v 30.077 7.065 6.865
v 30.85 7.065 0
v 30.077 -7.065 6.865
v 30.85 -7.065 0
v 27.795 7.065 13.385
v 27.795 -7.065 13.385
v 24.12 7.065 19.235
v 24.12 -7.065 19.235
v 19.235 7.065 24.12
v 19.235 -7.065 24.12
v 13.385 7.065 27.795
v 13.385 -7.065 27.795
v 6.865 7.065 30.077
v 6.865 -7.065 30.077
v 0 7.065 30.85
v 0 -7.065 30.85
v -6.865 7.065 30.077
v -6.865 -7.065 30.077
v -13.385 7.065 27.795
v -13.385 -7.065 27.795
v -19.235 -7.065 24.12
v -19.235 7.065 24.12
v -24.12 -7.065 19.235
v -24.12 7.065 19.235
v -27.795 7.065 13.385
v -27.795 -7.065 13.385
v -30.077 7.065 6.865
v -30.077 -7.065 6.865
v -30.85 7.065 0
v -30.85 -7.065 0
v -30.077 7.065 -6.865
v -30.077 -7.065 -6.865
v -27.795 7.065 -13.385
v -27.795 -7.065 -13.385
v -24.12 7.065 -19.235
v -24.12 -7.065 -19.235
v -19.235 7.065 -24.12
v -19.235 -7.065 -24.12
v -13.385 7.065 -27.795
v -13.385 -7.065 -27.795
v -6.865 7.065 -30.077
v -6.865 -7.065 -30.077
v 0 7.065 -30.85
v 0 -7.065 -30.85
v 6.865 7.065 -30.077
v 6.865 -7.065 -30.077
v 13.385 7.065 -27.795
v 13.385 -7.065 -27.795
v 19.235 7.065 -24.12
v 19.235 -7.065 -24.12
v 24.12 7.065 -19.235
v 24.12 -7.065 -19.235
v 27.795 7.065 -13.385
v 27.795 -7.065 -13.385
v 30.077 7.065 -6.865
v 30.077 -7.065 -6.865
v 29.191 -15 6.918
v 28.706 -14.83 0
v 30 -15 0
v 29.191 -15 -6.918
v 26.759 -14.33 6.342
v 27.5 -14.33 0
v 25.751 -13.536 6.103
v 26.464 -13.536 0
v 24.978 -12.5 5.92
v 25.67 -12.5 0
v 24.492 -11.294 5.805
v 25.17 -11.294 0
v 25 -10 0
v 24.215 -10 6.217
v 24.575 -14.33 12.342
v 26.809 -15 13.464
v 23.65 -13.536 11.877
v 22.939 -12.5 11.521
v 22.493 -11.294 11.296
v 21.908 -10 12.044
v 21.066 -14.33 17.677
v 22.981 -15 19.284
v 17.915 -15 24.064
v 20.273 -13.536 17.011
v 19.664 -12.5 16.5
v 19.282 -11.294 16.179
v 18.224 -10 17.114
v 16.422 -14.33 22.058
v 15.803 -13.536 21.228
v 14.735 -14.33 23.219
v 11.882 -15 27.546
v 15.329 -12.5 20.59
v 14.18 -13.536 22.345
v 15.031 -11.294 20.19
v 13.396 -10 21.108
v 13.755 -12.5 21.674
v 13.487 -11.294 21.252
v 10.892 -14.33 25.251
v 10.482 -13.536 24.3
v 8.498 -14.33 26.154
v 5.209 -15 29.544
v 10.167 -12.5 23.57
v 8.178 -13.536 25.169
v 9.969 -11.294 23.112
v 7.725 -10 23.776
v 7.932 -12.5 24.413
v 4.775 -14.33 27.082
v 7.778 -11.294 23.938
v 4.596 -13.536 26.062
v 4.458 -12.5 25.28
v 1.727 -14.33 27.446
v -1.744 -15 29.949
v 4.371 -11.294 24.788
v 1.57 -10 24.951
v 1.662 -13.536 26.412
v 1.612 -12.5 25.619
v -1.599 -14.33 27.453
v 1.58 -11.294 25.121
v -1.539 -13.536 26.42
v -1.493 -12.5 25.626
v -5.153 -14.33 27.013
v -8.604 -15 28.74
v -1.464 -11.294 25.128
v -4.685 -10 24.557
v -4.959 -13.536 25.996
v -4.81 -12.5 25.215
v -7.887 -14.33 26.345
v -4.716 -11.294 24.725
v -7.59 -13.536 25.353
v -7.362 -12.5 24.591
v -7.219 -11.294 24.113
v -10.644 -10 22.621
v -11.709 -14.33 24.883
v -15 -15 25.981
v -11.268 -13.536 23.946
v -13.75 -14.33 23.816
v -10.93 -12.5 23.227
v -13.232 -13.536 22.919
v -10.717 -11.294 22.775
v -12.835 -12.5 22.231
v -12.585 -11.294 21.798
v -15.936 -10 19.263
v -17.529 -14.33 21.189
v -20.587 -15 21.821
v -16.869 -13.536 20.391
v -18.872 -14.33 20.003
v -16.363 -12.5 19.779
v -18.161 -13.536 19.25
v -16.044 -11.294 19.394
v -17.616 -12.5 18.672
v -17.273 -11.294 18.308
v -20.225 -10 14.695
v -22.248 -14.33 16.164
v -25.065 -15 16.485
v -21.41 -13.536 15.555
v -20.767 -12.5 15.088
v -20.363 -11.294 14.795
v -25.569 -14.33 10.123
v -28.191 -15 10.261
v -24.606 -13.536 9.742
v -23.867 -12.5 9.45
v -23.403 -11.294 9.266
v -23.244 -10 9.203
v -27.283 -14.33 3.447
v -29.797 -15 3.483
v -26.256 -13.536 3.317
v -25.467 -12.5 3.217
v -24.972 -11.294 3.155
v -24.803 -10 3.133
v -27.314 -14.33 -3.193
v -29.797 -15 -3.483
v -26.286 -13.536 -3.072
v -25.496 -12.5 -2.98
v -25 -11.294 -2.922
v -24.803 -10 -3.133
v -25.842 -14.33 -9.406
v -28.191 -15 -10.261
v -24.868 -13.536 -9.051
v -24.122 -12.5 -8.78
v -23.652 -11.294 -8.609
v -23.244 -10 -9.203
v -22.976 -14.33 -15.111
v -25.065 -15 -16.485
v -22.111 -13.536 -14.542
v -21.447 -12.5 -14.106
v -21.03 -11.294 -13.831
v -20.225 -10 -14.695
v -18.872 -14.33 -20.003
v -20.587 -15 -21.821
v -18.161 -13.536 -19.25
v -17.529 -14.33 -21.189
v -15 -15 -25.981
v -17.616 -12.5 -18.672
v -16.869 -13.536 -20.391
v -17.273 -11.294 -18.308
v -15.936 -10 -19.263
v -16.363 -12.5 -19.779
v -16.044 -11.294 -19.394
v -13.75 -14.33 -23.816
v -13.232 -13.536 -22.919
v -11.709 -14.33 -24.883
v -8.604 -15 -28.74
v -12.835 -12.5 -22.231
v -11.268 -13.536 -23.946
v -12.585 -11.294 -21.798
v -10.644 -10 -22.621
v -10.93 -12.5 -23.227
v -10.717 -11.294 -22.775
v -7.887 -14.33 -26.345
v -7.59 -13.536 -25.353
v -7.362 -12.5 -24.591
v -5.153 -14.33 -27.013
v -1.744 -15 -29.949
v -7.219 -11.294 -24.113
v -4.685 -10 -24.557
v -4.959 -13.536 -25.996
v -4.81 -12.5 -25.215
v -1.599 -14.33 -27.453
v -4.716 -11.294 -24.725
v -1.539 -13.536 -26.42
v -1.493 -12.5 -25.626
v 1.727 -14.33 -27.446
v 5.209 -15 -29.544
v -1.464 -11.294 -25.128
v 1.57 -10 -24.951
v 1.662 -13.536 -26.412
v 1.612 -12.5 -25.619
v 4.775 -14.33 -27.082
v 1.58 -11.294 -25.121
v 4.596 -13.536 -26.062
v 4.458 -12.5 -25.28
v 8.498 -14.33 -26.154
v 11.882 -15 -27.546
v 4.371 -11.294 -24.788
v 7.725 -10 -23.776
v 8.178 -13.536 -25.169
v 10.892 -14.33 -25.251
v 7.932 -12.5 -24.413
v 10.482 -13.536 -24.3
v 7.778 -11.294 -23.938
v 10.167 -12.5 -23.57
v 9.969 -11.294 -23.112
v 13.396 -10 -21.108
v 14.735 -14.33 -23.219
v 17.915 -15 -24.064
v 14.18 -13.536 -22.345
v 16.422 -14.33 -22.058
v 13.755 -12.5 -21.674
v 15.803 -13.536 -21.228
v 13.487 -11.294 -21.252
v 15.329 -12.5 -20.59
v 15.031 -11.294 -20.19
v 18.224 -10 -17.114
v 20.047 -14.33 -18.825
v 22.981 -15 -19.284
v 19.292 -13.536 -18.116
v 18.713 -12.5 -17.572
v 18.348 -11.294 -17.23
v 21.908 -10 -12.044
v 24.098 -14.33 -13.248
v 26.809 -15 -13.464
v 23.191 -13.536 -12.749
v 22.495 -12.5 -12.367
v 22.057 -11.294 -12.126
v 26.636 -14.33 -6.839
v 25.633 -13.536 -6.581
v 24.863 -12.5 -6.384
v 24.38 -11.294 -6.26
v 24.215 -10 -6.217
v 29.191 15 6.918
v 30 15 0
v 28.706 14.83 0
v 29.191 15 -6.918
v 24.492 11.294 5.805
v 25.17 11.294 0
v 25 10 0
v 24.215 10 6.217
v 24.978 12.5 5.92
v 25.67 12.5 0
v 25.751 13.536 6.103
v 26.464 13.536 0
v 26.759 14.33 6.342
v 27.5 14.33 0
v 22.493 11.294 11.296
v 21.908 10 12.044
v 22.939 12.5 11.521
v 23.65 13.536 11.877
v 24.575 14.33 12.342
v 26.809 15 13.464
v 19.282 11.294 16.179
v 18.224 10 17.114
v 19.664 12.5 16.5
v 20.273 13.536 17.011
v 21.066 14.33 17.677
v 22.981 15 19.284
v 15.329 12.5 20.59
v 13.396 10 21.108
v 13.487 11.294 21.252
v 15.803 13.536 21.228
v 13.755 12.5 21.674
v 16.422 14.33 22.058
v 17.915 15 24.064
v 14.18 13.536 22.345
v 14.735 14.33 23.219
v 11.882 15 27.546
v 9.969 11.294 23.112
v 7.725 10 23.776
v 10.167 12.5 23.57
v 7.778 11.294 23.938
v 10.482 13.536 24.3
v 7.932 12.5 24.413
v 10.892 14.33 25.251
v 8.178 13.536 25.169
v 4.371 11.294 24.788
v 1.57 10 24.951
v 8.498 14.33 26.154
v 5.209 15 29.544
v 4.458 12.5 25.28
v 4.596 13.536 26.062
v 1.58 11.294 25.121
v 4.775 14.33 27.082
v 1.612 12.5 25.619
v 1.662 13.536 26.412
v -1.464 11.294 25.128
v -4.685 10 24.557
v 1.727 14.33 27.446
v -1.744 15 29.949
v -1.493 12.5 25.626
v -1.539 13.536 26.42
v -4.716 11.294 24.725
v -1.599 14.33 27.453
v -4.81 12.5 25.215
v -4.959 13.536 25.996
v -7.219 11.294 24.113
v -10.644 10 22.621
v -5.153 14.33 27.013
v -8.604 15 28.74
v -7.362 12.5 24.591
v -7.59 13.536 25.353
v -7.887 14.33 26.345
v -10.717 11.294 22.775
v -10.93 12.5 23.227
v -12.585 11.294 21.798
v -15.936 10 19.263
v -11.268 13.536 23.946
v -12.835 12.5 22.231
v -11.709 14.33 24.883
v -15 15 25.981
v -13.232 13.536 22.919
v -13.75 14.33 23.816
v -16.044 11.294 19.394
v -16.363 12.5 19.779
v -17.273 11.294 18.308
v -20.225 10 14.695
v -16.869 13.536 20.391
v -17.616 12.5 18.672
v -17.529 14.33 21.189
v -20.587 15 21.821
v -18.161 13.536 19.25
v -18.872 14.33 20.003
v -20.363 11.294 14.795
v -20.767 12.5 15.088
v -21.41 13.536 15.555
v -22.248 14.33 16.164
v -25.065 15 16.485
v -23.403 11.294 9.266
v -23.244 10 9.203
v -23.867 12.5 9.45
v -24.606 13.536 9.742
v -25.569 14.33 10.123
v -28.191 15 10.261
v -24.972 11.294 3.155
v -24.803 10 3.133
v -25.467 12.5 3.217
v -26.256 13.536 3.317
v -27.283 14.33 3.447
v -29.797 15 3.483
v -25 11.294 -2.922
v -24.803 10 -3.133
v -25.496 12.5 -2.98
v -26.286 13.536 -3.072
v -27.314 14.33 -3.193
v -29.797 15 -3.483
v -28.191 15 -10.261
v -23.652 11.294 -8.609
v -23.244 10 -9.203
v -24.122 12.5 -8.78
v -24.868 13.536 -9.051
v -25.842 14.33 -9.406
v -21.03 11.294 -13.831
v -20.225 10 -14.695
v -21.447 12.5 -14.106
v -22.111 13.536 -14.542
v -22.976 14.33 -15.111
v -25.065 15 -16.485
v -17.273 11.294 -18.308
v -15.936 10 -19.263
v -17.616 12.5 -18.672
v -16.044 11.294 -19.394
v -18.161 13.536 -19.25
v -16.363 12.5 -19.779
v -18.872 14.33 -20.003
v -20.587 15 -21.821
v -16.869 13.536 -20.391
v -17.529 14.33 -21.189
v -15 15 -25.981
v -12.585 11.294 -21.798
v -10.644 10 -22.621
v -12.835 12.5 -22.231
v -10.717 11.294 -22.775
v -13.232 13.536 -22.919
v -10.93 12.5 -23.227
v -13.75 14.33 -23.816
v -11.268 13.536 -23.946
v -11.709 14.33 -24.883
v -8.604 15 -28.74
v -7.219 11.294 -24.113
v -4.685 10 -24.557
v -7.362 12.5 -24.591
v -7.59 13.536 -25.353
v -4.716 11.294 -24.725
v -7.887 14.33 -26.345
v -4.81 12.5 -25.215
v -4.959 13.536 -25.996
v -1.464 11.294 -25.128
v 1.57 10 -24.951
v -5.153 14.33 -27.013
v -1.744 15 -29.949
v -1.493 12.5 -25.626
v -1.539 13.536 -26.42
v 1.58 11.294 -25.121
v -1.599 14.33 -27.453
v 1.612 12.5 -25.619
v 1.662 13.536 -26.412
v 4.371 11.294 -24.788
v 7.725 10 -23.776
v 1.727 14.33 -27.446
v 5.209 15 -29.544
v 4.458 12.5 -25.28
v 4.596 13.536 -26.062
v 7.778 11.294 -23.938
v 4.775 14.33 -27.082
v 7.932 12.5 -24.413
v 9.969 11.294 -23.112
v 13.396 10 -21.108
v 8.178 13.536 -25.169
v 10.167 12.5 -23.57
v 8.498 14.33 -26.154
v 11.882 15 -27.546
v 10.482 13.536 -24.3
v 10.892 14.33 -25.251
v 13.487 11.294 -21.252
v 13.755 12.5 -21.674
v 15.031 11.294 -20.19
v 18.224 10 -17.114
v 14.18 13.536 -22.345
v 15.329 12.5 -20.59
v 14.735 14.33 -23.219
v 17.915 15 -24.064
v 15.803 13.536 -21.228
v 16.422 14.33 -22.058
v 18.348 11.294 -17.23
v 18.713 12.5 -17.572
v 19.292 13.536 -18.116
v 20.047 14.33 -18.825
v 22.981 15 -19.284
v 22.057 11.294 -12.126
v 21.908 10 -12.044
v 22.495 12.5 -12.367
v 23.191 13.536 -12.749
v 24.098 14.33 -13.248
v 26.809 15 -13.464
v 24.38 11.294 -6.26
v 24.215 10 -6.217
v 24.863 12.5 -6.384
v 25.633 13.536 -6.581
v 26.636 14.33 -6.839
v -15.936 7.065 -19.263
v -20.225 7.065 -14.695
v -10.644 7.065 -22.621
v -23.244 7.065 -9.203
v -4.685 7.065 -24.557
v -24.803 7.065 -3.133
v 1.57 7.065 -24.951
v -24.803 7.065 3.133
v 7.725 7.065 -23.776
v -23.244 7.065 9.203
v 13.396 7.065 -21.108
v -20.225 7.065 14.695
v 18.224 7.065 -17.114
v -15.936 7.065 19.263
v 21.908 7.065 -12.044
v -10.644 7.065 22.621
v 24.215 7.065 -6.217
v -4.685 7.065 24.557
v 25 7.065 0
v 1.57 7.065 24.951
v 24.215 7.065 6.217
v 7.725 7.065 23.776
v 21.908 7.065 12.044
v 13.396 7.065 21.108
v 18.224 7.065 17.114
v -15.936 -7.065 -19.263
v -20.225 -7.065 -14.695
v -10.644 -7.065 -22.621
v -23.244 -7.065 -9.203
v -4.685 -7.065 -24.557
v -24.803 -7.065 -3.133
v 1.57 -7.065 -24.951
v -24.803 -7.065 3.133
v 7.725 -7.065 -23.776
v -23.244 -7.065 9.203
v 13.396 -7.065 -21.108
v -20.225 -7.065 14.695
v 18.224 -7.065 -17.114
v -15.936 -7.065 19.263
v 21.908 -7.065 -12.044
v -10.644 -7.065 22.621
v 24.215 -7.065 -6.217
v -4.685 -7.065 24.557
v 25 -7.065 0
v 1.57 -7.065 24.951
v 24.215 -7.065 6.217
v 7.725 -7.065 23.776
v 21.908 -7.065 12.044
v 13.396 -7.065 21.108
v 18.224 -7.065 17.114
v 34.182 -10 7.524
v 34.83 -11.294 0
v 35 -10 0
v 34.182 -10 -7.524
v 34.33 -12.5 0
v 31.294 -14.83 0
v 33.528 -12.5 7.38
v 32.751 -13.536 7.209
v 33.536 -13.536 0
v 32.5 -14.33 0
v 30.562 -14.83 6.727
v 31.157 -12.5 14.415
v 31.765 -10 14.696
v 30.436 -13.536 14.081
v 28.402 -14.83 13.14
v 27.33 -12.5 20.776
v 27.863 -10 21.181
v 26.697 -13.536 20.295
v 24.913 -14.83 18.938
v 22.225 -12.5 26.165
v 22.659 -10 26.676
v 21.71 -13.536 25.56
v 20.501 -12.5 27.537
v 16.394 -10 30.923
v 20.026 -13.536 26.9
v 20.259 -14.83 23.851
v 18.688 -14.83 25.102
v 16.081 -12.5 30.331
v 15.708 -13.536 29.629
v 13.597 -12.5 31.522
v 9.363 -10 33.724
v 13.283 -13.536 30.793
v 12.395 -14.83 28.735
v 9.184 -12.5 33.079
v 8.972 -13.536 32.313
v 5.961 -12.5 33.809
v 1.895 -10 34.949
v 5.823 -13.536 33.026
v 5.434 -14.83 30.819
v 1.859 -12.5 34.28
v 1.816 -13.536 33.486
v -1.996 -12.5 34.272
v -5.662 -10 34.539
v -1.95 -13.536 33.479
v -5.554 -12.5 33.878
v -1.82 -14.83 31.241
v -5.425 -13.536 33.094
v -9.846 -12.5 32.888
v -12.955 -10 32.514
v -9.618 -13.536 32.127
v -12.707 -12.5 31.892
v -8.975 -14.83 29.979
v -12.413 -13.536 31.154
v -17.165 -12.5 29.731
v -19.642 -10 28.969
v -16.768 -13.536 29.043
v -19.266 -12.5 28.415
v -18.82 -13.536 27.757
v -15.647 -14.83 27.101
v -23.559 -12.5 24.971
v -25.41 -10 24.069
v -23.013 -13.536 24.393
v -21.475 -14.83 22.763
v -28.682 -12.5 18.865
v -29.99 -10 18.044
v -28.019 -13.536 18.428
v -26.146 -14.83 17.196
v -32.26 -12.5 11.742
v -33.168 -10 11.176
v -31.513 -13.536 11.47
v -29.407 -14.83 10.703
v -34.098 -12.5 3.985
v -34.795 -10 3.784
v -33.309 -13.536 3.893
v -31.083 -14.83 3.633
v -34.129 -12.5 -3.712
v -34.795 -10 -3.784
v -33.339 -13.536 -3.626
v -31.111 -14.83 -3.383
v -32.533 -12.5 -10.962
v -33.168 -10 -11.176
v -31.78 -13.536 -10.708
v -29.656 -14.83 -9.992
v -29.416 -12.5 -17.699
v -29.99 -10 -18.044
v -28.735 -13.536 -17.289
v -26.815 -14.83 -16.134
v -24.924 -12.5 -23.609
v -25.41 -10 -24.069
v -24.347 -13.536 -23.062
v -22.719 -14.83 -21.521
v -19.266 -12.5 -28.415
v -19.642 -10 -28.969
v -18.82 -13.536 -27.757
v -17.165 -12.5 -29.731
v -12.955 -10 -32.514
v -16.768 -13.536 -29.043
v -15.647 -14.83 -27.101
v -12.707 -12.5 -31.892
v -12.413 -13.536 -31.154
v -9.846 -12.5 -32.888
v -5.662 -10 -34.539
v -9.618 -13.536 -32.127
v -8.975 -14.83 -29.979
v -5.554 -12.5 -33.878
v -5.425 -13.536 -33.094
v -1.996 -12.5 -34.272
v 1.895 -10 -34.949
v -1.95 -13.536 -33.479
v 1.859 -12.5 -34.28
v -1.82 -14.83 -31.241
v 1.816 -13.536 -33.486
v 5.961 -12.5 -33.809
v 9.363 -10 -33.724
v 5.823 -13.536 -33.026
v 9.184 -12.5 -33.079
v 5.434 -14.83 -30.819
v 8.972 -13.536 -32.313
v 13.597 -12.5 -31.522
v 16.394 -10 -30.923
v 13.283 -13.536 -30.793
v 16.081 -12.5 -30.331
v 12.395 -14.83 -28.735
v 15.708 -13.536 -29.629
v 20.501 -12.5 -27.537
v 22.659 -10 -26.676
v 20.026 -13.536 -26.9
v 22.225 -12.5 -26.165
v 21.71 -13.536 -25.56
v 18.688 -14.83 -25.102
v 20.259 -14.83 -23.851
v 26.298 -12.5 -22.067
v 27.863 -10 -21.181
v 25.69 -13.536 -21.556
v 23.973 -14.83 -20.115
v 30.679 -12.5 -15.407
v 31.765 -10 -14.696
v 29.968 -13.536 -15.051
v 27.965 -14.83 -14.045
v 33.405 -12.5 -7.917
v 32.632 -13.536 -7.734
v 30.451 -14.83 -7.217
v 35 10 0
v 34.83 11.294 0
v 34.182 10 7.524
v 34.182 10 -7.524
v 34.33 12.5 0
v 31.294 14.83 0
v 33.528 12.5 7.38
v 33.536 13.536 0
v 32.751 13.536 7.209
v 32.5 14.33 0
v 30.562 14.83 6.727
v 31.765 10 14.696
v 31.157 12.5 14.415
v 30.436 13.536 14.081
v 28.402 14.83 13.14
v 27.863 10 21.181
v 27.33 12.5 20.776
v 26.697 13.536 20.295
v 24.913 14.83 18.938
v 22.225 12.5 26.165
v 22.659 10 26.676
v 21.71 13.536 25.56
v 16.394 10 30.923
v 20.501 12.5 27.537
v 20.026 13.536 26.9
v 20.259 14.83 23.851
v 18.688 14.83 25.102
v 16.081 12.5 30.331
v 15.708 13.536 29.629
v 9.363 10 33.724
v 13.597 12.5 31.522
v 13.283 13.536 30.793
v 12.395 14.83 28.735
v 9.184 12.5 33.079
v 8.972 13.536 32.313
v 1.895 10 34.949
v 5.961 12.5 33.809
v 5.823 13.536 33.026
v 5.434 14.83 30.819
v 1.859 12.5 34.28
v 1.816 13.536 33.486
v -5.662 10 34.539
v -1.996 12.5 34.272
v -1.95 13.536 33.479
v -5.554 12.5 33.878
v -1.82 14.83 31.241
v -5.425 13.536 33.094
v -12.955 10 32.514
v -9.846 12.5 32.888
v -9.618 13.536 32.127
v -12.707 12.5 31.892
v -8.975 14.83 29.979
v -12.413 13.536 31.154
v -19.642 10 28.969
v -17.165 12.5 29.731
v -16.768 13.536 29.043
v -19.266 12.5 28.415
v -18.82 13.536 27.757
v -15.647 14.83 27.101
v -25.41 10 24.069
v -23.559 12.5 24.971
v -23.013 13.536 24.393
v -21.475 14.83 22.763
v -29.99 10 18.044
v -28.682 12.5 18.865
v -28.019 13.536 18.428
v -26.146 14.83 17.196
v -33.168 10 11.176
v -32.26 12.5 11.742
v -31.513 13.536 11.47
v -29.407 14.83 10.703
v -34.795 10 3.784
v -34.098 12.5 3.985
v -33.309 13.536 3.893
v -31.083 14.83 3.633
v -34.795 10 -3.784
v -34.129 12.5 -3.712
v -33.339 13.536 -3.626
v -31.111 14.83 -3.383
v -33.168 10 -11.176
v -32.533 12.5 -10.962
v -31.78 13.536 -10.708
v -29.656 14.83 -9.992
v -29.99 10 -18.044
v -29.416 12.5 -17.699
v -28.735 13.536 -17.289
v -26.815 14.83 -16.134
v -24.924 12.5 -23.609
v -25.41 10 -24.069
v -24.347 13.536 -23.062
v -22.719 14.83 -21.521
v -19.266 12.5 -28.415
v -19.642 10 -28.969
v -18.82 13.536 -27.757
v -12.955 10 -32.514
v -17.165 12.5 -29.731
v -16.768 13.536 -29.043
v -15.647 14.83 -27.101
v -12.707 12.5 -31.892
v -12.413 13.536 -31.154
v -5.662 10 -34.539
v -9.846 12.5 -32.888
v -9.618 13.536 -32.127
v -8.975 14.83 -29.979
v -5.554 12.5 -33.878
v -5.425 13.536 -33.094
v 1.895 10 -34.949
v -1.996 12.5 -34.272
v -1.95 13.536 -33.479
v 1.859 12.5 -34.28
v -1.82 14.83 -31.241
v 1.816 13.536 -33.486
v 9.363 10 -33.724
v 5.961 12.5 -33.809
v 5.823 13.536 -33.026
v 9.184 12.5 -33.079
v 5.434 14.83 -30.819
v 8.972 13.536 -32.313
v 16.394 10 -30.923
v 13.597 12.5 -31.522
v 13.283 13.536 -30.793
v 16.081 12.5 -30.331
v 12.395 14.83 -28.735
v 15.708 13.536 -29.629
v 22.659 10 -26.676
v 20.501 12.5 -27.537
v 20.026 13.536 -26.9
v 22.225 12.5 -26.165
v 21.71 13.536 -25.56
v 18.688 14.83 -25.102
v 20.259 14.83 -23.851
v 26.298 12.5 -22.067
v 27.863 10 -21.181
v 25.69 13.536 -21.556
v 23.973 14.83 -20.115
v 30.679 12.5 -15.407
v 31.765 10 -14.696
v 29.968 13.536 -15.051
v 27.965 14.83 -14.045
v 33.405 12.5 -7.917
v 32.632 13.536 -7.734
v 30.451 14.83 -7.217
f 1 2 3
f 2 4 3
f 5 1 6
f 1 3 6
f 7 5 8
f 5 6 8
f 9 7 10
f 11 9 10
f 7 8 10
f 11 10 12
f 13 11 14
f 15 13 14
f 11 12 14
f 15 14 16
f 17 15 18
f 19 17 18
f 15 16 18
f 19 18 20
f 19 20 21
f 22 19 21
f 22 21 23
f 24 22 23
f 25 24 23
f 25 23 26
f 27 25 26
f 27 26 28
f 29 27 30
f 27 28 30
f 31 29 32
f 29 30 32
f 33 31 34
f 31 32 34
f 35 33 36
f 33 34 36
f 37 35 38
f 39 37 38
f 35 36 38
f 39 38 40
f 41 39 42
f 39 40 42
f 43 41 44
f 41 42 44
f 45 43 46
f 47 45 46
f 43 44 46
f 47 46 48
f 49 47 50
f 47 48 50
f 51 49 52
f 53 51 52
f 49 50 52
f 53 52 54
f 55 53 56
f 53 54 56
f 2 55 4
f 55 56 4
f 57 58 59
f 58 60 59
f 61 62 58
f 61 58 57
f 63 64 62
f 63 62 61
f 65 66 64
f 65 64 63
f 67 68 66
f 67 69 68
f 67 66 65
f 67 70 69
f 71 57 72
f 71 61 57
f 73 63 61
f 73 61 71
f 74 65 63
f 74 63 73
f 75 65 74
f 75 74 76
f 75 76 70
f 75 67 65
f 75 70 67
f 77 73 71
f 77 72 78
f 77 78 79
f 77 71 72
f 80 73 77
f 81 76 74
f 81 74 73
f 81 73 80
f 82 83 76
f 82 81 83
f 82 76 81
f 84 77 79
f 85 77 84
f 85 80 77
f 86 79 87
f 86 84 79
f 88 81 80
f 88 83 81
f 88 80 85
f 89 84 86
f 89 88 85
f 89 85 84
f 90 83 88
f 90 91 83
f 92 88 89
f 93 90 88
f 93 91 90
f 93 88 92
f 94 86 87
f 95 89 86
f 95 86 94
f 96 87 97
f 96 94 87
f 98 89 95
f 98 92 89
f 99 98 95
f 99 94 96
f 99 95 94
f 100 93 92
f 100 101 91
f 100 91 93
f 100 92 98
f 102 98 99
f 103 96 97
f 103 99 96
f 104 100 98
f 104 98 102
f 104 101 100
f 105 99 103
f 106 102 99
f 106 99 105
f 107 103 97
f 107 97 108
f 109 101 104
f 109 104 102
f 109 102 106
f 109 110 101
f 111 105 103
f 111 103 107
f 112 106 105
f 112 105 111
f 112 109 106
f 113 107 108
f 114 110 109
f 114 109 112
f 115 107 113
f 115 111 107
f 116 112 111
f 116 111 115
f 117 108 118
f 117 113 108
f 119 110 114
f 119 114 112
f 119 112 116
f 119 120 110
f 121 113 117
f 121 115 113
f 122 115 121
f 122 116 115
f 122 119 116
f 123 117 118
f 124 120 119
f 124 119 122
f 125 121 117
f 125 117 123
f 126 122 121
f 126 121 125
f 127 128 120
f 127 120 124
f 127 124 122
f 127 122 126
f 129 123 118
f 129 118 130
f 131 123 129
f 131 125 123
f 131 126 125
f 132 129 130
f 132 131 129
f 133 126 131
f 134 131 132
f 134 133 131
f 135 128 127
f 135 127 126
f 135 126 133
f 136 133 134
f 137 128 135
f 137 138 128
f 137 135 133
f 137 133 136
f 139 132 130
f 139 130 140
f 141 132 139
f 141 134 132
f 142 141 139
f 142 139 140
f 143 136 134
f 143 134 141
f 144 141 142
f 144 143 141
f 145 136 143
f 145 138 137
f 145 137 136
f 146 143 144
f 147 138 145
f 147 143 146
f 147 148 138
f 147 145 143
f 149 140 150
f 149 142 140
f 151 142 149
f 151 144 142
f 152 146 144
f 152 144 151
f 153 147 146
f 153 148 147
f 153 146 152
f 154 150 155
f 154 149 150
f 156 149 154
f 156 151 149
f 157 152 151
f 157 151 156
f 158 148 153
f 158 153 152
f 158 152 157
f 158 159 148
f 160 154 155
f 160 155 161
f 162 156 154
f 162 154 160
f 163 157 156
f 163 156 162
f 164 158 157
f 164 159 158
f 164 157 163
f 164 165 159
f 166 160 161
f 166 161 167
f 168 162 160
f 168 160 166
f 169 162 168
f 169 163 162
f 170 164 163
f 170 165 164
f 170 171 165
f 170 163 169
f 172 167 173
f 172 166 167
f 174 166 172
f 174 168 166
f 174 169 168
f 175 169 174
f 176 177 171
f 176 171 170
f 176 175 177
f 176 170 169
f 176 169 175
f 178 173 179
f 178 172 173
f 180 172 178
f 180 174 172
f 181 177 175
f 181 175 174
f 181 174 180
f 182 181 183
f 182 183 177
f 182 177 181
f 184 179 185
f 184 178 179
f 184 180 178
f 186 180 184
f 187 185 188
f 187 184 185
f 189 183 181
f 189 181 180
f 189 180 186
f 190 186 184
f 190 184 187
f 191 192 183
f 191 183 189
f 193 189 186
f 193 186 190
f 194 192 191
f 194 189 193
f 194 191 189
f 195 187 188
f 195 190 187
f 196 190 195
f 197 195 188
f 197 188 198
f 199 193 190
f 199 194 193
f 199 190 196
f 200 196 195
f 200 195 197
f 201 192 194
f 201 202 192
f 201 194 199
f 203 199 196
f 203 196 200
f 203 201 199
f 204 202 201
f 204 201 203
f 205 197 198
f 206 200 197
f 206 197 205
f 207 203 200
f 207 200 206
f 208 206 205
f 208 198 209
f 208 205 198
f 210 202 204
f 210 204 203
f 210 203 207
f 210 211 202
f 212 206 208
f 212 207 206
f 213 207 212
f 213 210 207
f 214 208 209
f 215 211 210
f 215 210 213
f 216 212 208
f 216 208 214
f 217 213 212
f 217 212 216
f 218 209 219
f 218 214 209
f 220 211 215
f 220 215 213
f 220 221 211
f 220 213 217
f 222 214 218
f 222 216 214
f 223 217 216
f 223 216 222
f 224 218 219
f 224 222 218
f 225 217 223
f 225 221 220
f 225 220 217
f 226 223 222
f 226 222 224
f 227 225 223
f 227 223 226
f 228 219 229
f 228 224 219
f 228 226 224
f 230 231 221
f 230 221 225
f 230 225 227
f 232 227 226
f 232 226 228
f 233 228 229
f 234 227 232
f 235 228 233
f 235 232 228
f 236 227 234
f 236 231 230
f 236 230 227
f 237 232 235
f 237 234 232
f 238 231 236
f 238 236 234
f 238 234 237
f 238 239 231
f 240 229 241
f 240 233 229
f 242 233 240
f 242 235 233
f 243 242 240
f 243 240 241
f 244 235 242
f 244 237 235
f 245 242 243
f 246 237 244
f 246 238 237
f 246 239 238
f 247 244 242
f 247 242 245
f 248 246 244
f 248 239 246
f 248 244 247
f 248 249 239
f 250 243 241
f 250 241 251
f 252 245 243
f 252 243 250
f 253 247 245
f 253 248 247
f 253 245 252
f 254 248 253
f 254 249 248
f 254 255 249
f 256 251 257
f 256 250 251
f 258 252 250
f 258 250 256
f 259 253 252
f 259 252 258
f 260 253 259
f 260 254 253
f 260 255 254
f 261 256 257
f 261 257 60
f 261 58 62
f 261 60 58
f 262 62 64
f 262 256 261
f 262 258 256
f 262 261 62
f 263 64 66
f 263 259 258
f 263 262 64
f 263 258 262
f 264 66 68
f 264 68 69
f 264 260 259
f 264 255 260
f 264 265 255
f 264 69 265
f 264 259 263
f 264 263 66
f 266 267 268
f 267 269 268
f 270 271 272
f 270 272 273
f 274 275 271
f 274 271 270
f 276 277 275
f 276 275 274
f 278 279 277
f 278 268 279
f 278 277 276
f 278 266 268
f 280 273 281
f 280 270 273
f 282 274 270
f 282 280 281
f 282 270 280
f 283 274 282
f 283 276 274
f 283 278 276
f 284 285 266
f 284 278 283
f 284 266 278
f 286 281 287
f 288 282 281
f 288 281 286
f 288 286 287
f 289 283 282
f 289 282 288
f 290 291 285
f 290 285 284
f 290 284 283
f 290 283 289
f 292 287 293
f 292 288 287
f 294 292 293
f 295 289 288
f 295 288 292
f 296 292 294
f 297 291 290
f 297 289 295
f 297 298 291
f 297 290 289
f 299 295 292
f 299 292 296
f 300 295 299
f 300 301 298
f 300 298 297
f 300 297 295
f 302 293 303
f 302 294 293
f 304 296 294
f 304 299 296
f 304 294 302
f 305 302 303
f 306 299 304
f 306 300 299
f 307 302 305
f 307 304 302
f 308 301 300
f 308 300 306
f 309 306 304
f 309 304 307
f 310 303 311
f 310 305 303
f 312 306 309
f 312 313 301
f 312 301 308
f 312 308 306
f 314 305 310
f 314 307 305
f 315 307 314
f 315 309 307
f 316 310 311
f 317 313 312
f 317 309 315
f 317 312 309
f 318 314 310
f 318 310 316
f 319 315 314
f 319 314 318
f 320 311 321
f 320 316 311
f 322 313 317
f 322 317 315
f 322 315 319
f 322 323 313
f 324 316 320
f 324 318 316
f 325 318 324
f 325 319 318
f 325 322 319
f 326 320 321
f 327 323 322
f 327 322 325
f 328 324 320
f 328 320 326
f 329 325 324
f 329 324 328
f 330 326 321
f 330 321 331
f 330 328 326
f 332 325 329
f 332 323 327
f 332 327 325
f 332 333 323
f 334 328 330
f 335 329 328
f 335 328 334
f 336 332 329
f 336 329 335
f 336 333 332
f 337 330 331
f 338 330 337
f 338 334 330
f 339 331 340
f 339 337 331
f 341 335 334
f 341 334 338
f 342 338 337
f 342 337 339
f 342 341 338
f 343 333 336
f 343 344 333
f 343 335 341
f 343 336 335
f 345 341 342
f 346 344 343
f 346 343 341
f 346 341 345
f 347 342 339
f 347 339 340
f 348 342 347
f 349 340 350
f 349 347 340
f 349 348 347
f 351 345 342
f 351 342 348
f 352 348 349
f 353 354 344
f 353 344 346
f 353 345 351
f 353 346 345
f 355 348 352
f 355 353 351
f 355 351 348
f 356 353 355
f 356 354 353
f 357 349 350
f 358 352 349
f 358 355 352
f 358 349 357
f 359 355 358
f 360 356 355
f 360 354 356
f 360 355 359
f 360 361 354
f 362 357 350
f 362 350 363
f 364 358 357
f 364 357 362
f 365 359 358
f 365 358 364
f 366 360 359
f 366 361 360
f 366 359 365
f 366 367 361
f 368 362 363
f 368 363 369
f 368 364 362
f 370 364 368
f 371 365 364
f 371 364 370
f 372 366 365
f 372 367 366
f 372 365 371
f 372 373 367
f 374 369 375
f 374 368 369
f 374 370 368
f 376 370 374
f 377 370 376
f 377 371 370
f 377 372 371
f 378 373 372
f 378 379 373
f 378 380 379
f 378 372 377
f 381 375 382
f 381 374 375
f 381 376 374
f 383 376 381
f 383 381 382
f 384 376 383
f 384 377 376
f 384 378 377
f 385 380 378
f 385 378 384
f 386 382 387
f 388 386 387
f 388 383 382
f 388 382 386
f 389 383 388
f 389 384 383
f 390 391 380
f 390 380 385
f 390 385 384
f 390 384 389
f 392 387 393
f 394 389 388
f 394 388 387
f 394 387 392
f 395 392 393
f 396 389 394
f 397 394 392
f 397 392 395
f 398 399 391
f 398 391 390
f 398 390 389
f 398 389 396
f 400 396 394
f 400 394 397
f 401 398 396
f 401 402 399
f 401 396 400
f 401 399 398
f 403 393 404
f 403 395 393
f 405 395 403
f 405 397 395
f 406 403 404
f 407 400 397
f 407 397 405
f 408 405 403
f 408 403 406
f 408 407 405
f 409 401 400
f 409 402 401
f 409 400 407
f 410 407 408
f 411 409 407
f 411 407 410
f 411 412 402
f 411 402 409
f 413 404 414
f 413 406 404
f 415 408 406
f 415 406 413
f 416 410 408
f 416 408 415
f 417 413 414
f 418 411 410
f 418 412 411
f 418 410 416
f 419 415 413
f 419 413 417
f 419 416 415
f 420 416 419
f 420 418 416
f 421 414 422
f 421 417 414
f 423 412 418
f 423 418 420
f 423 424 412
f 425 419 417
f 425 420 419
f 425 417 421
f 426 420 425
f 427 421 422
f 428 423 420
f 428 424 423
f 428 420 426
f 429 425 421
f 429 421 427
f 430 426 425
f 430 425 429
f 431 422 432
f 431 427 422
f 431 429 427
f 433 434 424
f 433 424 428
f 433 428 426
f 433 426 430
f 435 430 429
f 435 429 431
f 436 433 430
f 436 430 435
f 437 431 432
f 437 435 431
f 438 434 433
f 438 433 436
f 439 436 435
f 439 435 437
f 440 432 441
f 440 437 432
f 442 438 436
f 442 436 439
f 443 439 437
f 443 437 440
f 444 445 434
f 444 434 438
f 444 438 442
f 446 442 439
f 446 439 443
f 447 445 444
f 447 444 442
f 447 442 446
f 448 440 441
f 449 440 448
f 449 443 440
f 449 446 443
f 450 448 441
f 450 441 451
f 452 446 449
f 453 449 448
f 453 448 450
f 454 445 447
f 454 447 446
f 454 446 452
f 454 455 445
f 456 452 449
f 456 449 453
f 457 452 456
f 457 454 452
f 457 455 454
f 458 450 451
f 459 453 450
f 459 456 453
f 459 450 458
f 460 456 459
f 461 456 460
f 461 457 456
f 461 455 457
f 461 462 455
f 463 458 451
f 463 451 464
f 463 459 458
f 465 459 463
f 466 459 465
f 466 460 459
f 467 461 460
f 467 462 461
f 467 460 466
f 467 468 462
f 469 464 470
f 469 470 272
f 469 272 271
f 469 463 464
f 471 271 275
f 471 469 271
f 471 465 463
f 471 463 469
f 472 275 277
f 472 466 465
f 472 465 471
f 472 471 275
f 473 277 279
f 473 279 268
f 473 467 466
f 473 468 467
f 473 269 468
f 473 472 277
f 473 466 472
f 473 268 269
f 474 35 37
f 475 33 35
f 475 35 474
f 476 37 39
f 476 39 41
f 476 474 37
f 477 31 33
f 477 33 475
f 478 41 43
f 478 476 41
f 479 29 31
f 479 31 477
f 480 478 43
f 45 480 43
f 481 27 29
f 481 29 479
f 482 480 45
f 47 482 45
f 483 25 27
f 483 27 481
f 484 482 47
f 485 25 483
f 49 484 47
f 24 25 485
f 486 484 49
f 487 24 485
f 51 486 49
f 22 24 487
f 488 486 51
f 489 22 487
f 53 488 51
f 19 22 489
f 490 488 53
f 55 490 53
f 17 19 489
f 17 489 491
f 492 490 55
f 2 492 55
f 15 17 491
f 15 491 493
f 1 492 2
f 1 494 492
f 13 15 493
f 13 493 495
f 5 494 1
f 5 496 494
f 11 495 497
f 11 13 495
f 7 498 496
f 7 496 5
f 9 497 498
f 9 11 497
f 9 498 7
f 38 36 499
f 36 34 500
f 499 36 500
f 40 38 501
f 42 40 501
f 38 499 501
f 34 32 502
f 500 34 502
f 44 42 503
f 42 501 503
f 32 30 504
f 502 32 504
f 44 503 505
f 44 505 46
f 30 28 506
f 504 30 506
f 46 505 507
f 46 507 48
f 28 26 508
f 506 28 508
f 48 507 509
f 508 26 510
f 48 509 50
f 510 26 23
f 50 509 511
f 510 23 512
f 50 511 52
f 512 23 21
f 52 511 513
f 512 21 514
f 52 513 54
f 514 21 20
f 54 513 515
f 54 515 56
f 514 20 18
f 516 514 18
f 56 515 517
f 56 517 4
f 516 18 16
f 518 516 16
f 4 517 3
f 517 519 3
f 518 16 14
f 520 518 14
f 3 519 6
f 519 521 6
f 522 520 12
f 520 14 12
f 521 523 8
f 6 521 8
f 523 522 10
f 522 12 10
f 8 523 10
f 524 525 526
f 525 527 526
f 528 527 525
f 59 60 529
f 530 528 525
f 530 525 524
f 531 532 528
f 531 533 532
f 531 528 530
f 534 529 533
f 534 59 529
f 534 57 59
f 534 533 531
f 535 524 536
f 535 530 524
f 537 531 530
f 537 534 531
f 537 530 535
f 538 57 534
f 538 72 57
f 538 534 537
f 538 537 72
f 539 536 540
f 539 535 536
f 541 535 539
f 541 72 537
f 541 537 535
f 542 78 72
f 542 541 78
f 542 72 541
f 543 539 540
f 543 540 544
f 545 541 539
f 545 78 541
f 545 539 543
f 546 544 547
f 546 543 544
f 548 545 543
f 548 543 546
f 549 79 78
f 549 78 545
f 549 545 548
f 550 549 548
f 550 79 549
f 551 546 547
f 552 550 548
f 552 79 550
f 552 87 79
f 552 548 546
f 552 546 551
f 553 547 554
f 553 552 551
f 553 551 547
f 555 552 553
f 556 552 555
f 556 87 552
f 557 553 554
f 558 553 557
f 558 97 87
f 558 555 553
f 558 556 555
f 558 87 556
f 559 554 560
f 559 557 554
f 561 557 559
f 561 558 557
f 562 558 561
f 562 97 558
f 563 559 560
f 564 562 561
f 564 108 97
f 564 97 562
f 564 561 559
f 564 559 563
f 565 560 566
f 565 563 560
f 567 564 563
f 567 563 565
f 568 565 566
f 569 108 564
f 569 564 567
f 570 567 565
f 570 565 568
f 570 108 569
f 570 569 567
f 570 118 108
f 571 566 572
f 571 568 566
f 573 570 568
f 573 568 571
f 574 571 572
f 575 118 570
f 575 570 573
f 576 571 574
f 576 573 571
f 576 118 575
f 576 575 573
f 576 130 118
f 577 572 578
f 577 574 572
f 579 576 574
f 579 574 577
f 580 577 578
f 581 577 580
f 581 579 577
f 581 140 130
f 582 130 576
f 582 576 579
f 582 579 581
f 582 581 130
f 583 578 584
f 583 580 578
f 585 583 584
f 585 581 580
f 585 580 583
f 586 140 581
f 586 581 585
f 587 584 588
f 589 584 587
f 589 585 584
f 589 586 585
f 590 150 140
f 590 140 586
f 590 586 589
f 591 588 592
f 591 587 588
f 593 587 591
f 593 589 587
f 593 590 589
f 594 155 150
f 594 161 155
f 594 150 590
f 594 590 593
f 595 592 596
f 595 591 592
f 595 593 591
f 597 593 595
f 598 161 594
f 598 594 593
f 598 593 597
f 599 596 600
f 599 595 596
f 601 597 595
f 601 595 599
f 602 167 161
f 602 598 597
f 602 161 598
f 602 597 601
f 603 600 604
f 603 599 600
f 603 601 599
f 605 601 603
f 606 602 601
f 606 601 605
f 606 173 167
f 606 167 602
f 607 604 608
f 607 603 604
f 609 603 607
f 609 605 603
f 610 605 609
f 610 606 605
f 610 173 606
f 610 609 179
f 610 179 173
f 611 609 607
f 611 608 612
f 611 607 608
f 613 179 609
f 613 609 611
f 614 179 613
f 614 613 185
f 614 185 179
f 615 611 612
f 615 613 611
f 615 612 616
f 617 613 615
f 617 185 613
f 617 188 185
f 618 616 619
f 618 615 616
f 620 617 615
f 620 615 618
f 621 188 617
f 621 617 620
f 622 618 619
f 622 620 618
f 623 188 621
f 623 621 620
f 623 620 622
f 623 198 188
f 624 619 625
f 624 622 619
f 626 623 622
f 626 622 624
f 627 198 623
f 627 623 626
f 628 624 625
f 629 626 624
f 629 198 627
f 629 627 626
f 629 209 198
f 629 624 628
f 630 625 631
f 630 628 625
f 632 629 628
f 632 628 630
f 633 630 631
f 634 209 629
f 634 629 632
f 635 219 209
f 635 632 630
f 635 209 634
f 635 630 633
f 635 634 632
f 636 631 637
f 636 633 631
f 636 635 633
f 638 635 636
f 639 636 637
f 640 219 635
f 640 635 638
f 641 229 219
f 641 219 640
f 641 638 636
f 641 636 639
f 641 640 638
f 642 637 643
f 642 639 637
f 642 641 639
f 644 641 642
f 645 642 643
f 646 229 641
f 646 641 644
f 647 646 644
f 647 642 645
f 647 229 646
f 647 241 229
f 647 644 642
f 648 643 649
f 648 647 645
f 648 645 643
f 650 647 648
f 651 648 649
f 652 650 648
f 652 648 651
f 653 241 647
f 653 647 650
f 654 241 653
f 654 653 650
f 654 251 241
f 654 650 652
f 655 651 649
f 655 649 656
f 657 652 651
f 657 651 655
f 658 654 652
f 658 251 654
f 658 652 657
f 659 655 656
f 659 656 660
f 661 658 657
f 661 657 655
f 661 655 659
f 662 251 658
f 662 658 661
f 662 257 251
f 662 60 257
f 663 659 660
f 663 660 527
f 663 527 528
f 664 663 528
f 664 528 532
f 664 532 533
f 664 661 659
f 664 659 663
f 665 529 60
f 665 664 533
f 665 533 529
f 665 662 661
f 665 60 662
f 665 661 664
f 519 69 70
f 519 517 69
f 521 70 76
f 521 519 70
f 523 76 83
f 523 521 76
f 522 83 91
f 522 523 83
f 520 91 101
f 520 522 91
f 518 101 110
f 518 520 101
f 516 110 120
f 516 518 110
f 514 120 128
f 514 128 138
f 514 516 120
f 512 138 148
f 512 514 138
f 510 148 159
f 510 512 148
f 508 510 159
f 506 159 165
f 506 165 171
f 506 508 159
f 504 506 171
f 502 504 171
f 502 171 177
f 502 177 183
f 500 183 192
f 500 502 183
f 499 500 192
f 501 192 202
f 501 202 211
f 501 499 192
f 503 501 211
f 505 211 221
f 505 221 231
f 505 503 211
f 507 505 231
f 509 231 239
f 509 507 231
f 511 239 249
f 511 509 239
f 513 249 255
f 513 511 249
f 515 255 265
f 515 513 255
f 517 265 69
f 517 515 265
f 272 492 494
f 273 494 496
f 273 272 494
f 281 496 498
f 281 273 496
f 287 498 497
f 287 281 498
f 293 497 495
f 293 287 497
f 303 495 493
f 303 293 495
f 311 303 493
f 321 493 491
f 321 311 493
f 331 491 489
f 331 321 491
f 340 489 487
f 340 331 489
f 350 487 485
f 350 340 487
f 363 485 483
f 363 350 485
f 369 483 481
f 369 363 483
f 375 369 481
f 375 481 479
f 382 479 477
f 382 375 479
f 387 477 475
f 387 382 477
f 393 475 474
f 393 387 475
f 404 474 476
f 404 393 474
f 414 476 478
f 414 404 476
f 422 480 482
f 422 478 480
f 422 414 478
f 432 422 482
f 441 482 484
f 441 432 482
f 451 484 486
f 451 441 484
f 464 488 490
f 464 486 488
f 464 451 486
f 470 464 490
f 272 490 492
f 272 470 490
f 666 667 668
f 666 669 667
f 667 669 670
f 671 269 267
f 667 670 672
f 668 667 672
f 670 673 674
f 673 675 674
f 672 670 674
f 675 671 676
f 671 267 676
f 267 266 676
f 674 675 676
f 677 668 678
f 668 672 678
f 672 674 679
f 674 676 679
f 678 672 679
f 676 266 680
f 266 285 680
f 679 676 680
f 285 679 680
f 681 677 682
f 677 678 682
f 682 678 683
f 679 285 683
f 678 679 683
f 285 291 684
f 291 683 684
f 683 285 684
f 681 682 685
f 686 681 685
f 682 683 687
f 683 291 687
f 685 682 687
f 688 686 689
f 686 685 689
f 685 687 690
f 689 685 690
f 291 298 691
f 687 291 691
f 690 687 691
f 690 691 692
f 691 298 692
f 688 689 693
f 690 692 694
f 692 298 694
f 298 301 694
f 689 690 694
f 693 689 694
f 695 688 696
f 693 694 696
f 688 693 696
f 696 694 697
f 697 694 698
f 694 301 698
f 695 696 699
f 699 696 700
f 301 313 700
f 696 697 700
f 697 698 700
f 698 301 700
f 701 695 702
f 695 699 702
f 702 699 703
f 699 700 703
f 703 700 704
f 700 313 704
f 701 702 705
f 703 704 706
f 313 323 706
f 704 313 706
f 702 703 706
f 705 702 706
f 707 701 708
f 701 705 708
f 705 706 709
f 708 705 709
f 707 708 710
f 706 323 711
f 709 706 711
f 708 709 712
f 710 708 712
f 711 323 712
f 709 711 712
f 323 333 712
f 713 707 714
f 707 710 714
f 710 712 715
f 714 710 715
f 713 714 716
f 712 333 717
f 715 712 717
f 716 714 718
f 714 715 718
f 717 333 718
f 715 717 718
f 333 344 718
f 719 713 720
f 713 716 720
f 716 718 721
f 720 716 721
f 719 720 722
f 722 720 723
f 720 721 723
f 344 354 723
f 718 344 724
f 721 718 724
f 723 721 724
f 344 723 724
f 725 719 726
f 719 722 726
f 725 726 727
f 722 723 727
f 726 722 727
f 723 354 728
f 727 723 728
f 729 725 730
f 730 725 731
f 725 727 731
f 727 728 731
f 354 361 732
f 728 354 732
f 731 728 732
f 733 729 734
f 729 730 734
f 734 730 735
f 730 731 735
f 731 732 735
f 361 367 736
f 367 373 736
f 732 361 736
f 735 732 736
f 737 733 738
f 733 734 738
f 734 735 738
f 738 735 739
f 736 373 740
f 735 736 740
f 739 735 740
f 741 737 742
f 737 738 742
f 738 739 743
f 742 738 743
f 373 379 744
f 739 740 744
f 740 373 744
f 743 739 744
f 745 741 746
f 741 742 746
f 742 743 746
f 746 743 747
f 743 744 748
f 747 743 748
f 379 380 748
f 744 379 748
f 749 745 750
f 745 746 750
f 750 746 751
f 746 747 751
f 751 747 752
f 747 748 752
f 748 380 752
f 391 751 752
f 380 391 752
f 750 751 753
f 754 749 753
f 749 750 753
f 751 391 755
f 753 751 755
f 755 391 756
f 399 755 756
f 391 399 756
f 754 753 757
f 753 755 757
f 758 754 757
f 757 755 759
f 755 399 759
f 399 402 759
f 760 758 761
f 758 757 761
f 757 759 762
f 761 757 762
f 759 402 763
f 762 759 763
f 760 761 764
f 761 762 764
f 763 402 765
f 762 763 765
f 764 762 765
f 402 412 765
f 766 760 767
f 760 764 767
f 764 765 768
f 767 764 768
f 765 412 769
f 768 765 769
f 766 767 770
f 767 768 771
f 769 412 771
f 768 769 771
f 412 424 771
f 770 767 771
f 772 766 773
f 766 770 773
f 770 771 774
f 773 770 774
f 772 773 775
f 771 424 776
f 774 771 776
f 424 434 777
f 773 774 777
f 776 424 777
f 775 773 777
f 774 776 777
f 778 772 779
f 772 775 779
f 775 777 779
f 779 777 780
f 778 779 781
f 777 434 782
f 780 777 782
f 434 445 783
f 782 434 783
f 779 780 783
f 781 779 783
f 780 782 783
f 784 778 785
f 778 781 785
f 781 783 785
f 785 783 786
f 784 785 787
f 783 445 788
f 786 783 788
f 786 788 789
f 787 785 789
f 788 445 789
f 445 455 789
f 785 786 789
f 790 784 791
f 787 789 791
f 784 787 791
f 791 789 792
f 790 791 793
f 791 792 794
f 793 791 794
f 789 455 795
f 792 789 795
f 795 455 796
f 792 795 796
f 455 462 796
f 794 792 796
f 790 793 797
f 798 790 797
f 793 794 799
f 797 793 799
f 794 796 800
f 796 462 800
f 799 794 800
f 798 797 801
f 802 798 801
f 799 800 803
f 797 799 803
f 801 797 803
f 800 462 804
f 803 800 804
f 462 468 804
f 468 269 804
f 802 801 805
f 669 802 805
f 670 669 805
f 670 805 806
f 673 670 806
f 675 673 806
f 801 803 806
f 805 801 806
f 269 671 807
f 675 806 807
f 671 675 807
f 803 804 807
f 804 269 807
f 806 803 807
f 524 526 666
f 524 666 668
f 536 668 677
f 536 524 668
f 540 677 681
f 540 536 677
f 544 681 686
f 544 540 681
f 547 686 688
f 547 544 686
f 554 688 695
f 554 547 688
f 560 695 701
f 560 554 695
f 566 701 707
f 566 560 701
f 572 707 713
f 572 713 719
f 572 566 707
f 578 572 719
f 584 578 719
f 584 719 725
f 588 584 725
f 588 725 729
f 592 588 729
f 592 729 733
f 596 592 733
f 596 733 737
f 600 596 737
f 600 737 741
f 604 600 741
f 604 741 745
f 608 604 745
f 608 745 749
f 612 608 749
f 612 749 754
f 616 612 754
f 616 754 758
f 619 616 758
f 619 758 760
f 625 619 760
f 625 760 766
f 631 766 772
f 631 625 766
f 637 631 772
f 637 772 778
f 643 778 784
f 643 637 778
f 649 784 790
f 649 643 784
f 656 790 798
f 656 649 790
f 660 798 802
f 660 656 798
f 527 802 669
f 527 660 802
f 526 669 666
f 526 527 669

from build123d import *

# Parameters (mm, degrees)
F0_R     = 35
F0_R_2   = 25
F1_DEPTH = 15
F2_R     = 4.99999
F3_R     = 30.85
F3_R_2   = 25.79
F4_DEPTH = 7.065


# Not quite as in the source:
# - a fillet or chamfer is up to 0.001 mm smaller than in the source, because OpenCascade refuses the exact size


with BuildPart() as f1:
    # F0 (on Front) → F1 (new body, symmetric)
    with BuildSketch(Plane.XZ):
        Circle(F0_R)
        Circle(F0_R_2, mode=Mode.SUBTRACT)
    extrude(amount=F1_DEPTH, both=True)

    # F2 (radius 5 in the source; OpenCascade refuses exactly that, so slightly less here)
    f2_edges = [f1.edges().sort_by_distance(p)[0] for p in [
        (-35, -15, 0),
        (-25, -15, 0),
        (-35, 15, 0),
        (-25, 15, 0),
    ]]
    fillet(f2_edges, radius=F2_R)

    # F3 (on Front) → F4 (cut, symmetric)
    with BuildSketch(Plane.XZ):
        Circle(F3_R)
        Circle(F3_R_2, mode=Mode.SUBTRACT)
        Circle(F3_R_2)
    extrude(amount=F4_DEPTH, both=True, mode=Mode.SUBTRACT)


solid = f1.part
